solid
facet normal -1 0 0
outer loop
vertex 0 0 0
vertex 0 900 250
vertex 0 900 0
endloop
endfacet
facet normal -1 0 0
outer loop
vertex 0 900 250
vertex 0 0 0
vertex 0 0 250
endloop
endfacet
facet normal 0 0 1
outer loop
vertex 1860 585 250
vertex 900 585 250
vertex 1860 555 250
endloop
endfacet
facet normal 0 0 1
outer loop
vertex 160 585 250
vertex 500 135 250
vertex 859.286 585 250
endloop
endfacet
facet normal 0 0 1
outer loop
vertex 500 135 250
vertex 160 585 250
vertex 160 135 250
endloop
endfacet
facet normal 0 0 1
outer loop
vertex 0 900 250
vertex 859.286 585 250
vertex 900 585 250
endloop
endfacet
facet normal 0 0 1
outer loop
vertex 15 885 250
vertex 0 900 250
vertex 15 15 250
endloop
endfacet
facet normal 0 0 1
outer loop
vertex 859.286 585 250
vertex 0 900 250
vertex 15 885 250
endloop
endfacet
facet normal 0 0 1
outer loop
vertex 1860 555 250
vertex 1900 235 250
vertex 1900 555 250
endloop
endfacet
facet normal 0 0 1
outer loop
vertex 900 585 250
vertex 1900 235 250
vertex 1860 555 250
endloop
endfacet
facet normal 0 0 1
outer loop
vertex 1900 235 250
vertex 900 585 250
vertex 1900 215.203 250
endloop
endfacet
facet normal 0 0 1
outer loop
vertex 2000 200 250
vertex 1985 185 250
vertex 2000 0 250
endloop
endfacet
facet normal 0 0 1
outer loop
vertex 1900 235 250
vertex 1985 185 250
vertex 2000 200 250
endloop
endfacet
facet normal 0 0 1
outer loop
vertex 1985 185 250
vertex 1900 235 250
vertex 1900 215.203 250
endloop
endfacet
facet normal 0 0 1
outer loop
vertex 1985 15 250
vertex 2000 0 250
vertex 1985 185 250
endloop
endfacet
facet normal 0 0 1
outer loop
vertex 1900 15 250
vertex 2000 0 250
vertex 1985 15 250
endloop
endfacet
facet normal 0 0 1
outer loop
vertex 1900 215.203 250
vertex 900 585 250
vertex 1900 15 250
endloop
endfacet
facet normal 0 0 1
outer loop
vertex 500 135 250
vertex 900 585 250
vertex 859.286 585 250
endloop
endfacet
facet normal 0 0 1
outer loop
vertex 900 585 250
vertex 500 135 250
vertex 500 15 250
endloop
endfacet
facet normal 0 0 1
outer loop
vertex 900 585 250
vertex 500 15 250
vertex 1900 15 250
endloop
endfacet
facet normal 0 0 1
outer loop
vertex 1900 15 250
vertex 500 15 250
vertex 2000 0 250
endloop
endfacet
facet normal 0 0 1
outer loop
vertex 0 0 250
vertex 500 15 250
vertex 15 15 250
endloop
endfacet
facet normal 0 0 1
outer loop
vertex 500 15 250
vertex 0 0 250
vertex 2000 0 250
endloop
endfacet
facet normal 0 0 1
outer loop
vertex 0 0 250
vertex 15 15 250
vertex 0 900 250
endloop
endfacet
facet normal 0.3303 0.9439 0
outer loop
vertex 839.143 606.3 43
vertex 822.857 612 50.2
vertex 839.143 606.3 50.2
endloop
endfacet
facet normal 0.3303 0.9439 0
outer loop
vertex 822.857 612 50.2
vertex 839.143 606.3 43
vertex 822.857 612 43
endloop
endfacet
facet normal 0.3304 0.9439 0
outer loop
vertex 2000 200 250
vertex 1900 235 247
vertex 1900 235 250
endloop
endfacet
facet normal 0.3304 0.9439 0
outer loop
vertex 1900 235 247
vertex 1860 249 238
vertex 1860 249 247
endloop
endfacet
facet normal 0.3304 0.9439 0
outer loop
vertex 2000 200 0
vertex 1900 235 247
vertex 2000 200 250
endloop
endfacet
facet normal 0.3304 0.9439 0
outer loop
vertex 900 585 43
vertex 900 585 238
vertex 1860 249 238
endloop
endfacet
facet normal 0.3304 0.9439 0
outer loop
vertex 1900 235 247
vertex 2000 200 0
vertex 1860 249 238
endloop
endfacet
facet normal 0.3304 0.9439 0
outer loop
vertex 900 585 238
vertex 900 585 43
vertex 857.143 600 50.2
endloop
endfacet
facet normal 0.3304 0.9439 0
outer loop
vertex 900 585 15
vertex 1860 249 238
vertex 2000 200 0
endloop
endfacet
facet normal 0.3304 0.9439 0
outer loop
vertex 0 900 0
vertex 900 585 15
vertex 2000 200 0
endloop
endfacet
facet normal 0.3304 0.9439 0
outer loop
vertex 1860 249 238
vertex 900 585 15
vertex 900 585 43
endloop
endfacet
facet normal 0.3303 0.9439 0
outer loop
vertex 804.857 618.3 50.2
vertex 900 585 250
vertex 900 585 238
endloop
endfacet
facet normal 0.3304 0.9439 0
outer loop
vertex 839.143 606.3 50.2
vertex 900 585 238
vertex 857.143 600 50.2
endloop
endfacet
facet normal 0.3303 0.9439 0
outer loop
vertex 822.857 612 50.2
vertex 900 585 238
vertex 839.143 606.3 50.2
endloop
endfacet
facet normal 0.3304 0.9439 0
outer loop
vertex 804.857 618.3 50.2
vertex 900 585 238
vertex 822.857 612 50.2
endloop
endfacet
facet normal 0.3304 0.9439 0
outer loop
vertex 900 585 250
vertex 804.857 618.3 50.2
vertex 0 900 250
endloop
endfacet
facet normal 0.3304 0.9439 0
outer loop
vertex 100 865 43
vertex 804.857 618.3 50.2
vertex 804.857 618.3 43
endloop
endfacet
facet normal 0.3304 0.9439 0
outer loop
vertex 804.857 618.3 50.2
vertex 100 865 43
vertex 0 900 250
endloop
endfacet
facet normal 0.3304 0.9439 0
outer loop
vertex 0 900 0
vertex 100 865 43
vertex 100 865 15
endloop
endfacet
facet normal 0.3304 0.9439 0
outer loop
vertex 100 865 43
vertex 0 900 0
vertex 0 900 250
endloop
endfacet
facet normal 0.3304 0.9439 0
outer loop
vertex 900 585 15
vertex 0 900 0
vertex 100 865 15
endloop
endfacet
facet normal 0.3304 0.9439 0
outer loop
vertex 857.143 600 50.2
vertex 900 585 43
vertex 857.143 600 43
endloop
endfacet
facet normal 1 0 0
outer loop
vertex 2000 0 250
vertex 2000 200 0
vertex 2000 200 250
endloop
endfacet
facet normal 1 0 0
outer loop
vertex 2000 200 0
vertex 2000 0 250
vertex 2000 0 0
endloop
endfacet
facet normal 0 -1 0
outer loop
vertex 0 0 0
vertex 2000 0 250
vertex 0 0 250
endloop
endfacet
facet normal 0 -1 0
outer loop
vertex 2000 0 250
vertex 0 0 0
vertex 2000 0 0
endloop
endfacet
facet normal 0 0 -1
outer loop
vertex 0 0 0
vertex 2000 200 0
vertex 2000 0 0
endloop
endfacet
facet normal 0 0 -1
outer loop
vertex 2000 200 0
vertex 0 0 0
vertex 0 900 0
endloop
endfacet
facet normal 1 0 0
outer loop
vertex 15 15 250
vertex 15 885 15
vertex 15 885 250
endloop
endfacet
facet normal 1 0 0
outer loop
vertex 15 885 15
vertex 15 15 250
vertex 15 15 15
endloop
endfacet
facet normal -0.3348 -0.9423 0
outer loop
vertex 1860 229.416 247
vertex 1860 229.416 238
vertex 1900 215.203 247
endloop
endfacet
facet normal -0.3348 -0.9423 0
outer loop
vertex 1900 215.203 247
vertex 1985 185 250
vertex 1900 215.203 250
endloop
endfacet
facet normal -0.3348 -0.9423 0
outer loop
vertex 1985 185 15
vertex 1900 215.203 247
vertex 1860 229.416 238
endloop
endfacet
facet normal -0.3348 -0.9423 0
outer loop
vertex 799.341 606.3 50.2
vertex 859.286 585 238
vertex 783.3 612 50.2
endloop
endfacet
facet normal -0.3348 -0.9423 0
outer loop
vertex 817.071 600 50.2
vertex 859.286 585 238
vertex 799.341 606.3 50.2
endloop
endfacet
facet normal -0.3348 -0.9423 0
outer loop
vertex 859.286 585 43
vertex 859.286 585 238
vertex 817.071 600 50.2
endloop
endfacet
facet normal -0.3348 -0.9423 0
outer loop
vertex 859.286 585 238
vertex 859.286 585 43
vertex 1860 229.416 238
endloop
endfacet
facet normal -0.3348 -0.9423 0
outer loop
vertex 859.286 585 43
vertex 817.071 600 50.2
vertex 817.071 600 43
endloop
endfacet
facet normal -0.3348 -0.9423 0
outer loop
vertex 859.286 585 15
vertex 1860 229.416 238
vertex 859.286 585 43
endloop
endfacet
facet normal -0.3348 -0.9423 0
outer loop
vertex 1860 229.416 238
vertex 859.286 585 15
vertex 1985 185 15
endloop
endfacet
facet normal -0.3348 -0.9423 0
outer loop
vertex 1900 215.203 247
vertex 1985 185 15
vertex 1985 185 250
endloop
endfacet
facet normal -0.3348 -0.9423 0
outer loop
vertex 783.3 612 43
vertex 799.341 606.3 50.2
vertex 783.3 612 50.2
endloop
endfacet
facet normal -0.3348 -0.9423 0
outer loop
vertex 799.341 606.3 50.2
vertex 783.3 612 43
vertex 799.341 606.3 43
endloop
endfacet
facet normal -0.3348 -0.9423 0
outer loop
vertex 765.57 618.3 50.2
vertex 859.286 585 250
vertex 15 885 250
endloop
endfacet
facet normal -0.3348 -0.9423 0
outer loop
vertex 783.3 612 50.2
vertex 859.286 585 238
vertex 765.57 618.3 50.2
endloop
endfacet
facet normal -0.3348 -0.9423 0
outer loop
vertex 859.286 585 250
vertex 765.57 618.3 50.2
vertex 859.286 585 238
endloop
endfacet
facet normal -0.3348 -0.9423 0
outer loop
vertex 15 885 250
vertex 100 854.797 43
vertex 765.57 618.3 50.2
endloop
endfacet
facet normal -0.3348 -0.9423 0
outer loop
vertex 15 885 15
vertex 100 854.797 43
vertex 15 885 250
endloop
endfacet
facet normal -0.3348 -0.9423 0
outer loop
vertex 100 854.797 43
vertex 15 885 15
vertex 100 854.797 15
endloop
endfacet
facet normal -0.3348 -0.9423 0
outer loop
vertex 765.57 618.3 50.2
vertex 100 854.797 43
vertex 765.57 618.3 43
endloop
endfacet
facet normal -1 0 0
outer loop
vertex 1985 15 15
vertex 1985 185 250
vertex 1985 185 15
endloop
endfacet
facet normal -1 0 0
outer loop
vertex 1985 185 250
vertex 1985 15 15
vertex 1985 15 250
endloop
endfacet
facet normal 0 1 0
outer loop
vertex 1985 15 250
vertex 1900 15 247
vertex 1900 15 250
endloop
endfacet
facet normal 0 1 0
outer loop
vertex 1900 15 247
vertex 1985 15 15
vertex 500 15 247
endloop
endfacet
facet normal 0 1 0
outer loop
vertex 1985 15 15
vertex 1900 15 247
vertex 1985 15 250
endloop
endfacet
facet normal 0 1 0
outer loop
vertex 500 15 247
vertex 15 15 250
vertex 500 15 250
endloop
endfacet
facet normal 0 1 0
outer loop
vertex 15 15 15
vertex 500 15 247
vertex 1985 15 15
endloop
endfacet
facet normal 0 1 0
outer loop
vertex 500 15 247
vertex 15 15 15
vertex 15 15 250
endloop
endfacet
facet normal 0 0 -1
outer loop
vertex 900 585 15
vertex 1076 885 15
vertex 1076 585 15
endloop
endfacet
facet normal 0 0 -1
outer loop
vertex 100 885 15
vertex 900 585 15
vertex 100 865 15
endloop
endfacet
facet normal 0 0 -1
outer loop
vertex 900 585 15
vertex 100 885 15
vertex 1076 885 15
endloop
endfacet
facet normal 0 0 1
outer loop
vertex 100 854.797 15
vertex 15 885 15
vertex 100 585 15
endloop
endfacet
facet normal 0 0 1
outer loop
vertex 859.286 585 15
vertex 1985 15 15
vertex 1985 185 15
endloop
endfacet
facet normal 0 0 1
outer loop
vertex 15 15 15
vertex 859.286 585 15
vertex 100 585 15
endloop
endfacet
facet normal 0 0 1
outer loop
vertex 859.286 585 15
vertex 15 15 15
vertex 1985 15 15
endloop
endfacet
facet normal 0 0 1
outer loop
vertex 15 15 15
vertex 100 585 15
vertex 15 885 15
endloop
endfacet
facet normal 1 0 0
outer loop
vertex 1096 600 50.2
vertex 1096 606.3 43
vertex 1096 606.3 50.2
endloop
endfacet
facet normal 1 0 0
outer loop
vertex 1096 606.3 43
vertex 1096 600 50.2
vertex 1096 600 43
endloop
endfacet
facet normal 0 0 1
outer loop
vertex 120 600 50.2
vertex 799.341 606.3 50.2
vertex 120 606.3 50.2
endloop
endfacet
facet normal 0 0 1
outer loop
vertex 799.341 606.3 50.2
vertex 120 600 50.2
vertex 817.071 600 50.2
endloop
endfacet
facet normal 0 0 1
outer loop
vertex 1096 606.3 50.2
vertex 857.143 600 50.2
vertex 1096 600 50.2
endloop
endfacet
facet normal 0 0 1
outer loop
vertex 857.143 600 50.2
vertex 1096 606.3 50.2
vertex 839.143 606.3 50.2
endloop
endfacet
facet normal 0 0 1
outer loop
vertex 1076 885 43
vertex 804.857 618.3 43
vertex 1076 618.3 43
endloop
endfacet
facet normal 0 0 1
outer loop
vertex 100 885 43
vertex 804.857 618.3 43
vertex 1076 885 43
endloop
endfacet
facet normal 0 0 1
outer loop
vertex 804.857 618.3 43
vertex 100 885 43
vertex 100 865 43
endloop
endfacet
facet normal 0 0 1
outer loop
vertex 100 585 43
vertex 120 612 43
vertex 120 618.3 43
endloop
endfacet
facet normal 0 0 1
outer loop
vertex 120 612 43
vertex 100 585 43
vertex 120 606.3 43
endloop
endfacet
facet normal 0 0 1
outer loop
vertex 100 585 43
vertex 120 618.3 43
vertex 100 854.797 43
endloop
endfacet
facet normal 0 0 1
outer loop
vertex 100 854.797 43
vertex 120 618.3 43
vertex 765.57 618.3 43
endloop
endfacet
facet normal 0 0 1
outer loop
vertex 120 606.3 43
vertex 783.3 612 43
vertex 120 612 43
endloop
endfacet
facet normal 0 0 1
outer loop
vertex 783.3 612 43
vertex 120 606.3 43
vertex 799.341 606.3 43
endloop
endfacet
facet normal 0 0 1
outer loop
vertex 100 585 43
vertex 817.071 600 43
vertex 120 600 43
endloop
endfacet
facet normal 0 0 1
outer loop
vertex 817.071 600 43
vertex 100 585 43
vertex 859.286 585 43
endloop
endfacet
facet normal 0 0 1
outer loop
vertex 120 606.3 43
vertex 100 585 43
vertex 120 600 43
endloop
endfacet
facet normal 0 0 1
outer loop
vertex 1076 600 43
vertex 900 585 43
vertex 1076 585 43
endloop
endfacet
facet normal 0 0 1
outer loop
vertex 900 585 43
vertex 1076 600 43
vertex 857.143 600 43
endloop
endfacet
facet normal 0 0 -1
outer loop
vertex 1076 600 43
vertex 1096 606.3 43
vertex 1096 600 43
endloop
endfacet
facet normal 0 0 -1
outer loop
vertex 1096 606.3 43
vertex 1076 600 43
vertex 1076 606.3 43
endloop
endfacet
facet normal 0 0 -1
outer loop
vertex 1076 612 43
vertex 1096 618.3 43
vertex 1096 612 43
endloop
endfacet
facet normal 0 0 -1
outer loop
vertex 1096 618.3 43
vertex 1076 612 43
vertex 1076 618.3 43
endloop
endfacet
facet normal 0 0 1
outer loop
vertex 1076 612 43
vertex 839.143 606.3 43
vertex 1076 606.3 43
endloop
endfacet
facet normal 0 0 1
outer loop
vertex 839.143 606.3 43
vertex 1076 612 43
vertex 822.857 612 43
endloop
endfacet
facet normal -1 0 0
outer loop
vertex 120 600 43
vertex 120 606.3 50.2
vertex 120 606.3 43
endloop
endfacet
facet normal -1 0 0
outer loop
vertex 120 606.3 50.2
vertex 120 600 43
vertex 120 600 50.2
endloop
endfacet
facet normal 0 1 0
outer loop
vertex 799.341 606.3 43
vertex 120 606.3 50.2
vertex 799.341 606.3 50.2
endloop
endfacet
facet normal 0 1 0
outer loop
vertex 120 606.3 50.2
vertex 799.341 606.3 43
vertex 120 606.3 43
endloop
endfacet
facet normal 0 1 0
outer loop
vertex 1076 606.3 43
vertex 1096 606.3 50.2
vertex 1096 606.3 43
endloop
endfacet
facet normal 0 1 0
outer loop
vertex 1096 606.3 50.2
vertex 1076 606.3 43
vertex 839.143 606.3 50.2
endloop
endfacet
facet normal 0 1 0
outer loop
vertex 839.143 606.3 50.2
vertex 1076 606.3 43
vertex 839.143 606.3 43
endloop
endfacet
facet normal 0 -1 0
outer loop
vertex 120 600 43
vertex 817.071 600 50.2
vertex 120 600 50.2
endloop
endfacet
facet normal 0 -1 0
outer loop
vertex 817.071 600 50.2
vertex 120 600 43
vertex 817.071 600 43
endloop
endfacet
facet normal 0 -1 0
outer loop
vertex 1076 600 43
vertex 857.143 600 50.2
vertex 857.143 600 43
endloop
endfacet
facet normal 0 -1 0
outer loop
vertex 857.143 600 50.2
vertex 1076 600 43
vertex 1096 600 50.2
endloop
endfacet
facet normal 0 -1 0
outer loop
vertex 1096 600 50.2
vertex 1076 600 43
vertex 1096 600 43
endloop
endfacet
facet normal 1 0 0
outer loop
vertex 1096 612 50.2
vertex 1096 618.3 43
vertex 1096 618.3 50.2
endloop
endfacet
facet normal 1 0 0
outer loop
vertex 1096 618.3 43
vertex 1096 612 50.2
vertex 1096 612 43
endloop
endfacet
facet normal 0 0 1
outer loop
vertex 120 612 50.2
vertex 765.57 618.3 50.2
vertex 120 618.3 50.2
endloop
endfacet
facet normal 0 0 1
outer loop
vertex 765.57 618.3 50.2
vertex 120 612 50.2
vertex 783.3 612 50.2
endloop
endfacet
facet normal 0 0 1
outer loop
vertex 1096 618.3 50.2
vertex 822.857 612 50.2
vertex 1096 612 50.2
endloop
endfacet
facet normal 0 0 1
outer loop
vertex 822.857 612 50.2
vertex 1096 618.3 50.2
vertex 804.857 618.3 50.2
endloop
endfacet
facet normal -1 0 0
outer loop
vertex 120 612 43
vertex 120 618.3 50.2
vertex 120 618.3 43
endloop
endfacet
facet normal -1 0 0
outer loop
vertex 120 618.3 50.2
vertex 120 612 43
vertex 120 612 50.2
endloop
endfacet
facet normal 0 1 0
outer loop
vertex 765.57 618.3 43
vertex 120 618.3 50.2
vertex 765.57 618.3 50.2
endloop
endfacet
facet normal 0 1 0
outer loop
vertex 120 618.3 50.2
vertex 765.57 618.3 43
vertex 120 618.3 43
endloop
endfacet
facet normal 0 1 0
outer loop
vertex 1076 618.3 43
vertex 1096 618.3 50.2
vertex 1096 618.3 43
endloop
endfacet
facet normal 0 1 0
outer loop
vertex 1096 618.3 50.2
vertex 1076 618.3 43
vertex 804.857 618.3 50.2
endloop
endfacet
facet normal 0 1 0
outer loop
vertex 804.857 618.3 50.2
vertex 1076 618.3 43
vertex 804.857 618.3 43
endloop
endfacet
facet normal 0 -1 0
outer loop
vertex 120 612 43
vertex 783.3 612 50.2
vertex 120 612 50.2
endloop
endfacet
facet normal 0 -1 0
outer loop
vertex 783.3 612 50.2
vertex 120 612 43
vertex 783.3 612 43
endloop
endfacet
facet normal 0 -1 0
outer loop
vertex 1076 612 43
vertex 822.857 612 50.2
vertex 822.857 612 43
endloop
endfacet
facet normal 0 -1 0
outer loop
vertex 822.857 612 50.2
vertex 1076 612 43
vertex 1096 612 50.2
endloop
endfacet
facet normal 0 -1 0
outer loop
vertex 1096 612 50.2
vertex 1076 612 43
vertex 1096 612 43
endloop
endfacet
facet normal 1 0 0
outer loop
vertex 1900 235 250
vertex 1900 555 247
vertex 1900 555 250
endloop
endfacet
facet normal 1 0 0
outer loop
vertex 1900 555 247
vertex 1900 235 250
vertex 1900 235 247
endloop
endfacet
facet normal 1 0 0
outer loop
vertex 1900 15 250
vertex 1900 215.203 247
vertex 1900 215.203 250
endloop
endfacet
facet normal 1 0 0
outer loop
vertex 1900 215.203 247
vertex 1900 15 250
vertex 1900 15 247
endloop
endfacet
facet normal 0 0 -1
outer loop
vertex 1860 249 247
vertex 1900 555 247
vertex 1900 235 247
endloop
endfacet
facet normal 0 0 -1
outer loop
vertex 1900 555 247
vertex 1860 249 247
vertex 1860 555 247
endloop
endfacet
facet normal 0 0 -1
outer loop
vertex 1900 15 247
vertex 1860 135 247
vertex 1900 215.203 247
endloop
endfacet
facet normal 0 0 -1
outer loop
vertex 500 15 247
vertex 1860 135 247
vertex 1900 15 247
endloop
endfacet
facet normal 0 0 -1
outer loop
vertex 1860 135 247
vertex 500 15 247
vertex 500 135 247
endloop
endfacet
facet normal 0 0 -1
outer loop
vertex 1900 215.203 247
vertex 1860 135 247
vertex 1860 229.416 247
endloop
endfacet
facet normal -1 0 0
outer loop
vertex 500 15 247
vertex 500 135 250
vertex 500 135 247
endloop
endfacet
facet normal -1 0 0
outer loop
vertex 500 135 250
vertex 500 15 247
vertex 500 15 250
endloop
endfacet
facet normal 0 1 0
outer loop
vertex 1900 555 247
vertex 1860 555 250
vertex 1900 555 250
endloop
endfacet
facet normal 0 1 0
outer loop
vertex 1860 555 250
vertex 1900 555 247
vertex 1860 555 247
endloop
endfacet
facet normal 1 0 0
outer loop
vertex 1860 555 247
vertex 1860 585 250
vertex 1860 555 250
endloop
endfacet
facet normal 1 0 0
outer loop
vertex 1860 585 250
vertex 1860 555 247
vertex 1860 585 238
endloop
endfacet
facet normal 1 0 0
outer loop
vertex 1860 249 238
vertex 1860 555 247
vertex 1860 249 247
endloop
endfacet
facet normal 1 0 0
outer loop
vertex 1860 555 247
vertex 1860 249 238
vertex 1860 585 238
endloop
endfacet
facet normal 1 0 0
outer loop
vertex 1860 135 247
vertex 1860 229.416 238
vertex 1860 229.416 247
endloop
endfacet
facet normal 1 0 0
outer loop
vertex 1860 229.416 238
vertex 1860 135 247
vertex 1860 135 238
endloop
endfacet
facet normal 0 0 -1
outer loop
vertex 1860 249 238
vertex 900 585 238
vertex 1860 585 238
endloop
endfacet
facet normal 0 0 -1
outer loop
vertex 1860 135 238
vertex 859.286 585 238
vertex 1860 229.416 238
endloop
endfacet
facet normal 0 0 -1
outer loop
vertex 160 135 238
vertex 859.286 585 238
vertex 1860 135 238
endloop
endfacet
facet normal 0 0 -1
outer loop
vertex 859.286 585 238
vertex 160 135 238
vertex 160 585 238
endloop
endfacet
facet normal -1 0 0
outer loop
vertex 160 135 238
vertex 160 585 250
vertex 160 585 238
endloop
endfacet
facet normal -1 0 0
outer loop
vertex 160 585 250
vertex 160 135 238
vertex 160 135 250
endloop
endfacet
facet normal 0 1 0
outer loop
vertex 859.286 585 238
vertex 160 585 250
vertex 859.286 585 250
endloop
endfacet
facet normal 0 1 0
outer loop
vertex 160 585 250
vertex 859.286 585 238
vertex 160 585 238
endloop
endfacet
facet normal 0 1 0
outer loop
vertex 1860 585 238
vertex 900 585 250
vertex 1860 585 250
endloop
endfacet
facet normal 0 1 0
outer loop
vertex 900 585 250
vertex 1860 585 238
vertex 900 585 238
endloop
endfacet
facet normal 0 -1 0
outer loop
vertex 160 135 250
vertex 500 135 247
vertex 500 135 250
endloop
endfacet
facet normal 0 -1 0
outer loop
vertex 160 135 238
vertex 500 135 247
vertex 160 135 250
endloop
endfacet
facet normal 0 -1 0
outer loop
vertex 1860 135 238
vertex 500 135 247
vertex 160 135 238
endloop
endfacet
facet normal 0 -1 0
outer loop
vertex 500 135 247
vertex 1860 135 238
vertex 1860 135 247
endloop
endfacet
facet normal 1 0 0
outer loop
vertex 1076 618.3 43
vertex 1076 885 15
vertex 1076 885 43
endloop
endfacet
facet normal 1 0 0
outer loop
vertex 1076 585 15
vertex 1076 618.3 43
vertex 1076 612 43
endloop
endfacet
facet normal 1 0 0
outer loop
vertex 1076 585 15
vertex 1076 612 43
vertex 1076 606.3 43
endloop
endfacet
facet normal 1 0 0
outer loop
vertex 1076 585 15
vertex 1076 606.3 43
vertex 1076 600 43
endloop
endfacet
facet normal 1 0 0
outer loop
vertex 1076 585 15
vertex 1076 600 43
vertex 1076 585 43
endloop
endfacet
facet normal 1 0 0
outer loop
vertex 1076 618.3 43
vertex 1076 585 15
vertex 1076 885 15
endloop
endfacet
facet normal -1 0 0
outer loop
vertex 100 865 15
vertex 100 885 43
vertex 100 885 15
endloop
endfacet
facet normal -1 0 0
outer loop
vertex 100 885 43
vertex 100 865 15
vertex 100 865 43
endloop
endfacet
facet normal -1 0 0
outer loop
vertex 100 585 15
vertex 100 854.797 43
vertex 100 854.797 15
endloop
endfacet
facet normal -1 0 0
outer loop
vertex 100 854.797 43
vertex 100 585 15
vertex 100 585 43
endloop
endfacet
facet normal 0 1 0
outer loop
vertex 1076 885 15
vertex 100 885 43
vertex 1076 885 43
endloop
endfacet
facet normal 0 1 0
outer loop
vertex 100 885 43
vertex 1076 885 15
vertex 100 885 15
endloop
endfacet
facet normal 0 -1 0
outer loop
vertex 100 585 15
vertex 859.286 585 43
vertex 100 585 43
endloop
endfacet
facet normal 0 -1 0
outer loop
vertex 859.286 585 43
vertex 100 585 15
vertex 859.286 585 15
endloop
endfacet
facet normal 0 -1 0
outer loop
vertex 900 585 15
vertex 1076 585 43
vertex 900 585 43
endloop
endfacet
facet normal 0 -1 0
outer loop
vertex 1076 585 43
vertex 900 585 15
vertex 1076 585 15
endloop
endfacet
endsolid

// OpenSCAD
// Harpsichord — parametric STRUCTURAL-ENVELOPE scaffold (concept-only packet).
//
// Authority: pending_measurement. NOT fabrication authority.
// ---------------------------------------------------------------------------
// HONESTY BOUNDARY (read before using any value here):
//   This packet is deliberately NON-DIMENSIONAL. design.md, bom.csv,
//   cut-list.csv, docs/parametric-design-table.md and docs/tolerance-and-fit-
//   analysis.md release NO absolute dimensions — every value is
//   `pending_measurement`. Therefore EVERY numeric leaf value below is a
//   RENDER-ONLY PLACEHOLDER chosen only so the envelope draws; NONE is a
//   design, stringing, tuning, or fabrication authority. Placeholders are
//   tagged `// PLACEHOLDER`.
//   The DOCUMENTED content this file honestly encodes is the set of SYMBOLIC
//   RELATIONSHIPS from docs/parametric-design-table.md (HC-PAR-00x) and the
//   subsystem envelope layout — expressed as formulas, not baked values.
//   Mechanism detail (jack internals, tongue pivot, plectrum cut, damper) is
//   intentionally OUT OF SCOPE — see design.md "Concept Boundary".
//   Promote a placeholder to a real value only via a measured/reviewed row in
//   visual-output-register.csv + docs/measurement-and-validation-protocol.md.
// ---------------------------------------------------------------------------
// Units: millimeters.

/* [Case envelope — PLACEHOLDER extents, single-manual concept] */
case_length_mm     = 2000;  // PLACEHOLDER spine length; no released case size
case_width_mm      = 900;   // PLACEHOLDER cheek-to-spine width
case_depth_mm      = 250;   // PLACEHOLDER case wall height
wall_thk_mm        = 15;    // PLACEHOLDER case wall thickness
tail_width_mm      = 200;   // PLACEHOLDER tail (narrow end) width -> bentside taper

/* [Keyboard envelope — HC-PAR-001, all PLACEHOLDER] */
key_count          = 61;    // PLACEHOLDER compass (K_scope pending_measurement)
key_spacing_mm     = 16.0;  // PLACEHOLDER octave/spacing (K_spacing pending)
key_dip_mm         = 8.0;   // PLACEHOLDER K_dip (pending_measurement)
key_lever_ratio    = 1.0;   // PLACEHOLDER lever ratio (K_tailLift = f(K_dip,ratio))
keyboard_depth_mm  = 300;   // PLACEHOLDER keyboard well depth

/* [Action / jack-register envelope — HC-PAR-002..004, all PLACEHOLDER] */
choir_count        = 2;     // PLACEHOLDER 8' + 4' registers
plectrum_engage_mm = 1.5;   // PLACEHOLDER P_engagement (pending_measurement)
tongue_reset_mm    = 1.0;   // PLACEHOLDER T_reset margin (pending_measurement)
jack_clearance_mm  = 0.3;   // PLACEHOLDER J_clearance (pending_measurement)
register_slide_mm  = 6.0;   // PLACEHOLDER R_slide travel (pending_measurement)
jack_row_pitch_mm  = 12.0;  // PLACEHOLDER spacing between choir jack rows

/* [Soundboard / string band envelope — HC-PAR-005..007, all PLACEHOLDER] */
soundboard_thk_mm  = 3.0;   // PLACEHOLDER soundboard thickness (pending)
bridge_height_mm   = 12.0;  // PLACEHOLDER bridge height (B_bridge pending)
string_band_frac   = 0.85;  // PLACEHOLDER string-band as fraction of case length

// ---------------------------------------------------------------------------
// Derived geometry — DOCUMENTED symbolic relationships as formulas
// (docs/parametric-design-table.md). These are the honest, source-traceable
// part of this model; the leaf inputs above are placeholders.
// ---------------------------------------------------------------------------

// HC-PAR-001: key tail lift delivered to the jack.
function key_tail_lift(dip, ratio) = dip * ratio;
K_tailLift = key_tail_lift(key_dip_mm, key_lever_ratio);

// HC-PAR-002: jack lift must cover pluck engagement + reset margin.
function required_jack_lift(engage, reset) = engage + reset;   // J_lift >= ...
J_lift = required_jack_lift(plectrum_engage_mm, tongue_reset_mm);

// HC-PAR-004: register alignment margin includes jack clearance + slide state.
function register_alignment(clearance, slide) = clearance + slide;
R_alignment = register_alignment(jack_clearance_mm, register_slide_mm);

keyboard_width_mm = key_count * key_spacing_mm;   // spans compass * spacing
string_band_len_mm = case_length_mm * string_band_frac;

// Assertion echoes the governing inequality so `openscad` doubles as a check.
lift_ok = (K_tailLift >= J_lift);

// ---------------------------------------------------------------------------
// Envelope modules (structural volumes only; no mechanism internals)
// ---------------------------------------------------------------------------

module case_shell() {
  // Wing/harp plan approximated by a tapered prism (spine straight, bentside
  // taper to the tail). PLACEHOLDER outline; real bentside curve pending.
  difference() {
    linear_extrude(height = case_depth_mm)
      polygon(points = [
        [0, 0], [case_length_mm, 0],
        [case_length_mm, tail_width_mm], [0, case_width_mm]
      ]);
    translate([wall_thk_mm, wall_thk_mm, wall_thk_mm])
      linear_extrude(height = case_depth_mm)
        polygon(points = [
          [0, 0], [case_length_mm - 2*wall_thk_mm, 0],
          [case_length_mm - 2*wall_thk_mm, tail_width_mm - 2*wall_thk_mm],
          [0, case_width_mm - 2*wall_thk_mm]
        ]);
  }
}

module soundboard() {
  // Thin plate over the rear of the case (structural envelope, not braced).
  translate([case_length_mm*0.25, wall_thk_mm, case_depth_mm - soundboard_thk_mm])
    cube([case_length_mm*0.7, case_width_mm*0.6, soundboard_thk_mm]);
}

module string_band() {
  // Speaking-length band from wrestplank to hitchrail (envelope only).
  translate([case_length_mm*0.08, case_width_mm*0.15, case_depth_mm - bridge_height_mm])
    cube([string_band_len_mm, case_width_mm*0.5, bridge_height_mm]);
}

module keyboard_well() {
  // Keyboard footprint at the front (nameboard end).
  translate([case_length_mm*0.05, case_width_mm - keyboard_depth_mm - wall_thk_mm, wall_thk_mm])
    cube([keyboard_width_mm, keyboard_depth_mm, key_dip_mm + 20]);  // +20 PLACEHOLDER key stack
}

module register_rail_envelope() {
  // choir_count jack rows at jack_row_pitch spacing, above the keyboard.
  for (c = [0 : choir_count-1])
    translate([case_length_mm*0.06, case_width_mm - keyboard_depth_mm + c*jack_row_pitch_mm,
               wall_thk_mm + key_dip_mm + 20])
      cube([keyboard_width_mm, register_slide_mm + jack_clearance_mm, jack_row_pitch_mm*0.6]);
}

module harpsichord_assembly() {
  case_shell();
  soundboard();
  string_band();
  keyboard_well();
  register_rail_envelope();
}

harpsichord_assembly();

echo(str("HC-PAR-001 K_tailLift_mm=", K_tailLift));
echo(str("HC-PAR-002 J_lift_min_mm=", J_lift));
echo(str("HC-PAR-004 R_alignment_mm=", R_alignment));
echo(str("keyboard_width_mm=", keyboard_width_mm));
echo(str("lift_margin_ok(placeholder)=", lift_ok));
echo("AUTHORITY=pending_measurement; all leaf values are render-only placeholders.");
